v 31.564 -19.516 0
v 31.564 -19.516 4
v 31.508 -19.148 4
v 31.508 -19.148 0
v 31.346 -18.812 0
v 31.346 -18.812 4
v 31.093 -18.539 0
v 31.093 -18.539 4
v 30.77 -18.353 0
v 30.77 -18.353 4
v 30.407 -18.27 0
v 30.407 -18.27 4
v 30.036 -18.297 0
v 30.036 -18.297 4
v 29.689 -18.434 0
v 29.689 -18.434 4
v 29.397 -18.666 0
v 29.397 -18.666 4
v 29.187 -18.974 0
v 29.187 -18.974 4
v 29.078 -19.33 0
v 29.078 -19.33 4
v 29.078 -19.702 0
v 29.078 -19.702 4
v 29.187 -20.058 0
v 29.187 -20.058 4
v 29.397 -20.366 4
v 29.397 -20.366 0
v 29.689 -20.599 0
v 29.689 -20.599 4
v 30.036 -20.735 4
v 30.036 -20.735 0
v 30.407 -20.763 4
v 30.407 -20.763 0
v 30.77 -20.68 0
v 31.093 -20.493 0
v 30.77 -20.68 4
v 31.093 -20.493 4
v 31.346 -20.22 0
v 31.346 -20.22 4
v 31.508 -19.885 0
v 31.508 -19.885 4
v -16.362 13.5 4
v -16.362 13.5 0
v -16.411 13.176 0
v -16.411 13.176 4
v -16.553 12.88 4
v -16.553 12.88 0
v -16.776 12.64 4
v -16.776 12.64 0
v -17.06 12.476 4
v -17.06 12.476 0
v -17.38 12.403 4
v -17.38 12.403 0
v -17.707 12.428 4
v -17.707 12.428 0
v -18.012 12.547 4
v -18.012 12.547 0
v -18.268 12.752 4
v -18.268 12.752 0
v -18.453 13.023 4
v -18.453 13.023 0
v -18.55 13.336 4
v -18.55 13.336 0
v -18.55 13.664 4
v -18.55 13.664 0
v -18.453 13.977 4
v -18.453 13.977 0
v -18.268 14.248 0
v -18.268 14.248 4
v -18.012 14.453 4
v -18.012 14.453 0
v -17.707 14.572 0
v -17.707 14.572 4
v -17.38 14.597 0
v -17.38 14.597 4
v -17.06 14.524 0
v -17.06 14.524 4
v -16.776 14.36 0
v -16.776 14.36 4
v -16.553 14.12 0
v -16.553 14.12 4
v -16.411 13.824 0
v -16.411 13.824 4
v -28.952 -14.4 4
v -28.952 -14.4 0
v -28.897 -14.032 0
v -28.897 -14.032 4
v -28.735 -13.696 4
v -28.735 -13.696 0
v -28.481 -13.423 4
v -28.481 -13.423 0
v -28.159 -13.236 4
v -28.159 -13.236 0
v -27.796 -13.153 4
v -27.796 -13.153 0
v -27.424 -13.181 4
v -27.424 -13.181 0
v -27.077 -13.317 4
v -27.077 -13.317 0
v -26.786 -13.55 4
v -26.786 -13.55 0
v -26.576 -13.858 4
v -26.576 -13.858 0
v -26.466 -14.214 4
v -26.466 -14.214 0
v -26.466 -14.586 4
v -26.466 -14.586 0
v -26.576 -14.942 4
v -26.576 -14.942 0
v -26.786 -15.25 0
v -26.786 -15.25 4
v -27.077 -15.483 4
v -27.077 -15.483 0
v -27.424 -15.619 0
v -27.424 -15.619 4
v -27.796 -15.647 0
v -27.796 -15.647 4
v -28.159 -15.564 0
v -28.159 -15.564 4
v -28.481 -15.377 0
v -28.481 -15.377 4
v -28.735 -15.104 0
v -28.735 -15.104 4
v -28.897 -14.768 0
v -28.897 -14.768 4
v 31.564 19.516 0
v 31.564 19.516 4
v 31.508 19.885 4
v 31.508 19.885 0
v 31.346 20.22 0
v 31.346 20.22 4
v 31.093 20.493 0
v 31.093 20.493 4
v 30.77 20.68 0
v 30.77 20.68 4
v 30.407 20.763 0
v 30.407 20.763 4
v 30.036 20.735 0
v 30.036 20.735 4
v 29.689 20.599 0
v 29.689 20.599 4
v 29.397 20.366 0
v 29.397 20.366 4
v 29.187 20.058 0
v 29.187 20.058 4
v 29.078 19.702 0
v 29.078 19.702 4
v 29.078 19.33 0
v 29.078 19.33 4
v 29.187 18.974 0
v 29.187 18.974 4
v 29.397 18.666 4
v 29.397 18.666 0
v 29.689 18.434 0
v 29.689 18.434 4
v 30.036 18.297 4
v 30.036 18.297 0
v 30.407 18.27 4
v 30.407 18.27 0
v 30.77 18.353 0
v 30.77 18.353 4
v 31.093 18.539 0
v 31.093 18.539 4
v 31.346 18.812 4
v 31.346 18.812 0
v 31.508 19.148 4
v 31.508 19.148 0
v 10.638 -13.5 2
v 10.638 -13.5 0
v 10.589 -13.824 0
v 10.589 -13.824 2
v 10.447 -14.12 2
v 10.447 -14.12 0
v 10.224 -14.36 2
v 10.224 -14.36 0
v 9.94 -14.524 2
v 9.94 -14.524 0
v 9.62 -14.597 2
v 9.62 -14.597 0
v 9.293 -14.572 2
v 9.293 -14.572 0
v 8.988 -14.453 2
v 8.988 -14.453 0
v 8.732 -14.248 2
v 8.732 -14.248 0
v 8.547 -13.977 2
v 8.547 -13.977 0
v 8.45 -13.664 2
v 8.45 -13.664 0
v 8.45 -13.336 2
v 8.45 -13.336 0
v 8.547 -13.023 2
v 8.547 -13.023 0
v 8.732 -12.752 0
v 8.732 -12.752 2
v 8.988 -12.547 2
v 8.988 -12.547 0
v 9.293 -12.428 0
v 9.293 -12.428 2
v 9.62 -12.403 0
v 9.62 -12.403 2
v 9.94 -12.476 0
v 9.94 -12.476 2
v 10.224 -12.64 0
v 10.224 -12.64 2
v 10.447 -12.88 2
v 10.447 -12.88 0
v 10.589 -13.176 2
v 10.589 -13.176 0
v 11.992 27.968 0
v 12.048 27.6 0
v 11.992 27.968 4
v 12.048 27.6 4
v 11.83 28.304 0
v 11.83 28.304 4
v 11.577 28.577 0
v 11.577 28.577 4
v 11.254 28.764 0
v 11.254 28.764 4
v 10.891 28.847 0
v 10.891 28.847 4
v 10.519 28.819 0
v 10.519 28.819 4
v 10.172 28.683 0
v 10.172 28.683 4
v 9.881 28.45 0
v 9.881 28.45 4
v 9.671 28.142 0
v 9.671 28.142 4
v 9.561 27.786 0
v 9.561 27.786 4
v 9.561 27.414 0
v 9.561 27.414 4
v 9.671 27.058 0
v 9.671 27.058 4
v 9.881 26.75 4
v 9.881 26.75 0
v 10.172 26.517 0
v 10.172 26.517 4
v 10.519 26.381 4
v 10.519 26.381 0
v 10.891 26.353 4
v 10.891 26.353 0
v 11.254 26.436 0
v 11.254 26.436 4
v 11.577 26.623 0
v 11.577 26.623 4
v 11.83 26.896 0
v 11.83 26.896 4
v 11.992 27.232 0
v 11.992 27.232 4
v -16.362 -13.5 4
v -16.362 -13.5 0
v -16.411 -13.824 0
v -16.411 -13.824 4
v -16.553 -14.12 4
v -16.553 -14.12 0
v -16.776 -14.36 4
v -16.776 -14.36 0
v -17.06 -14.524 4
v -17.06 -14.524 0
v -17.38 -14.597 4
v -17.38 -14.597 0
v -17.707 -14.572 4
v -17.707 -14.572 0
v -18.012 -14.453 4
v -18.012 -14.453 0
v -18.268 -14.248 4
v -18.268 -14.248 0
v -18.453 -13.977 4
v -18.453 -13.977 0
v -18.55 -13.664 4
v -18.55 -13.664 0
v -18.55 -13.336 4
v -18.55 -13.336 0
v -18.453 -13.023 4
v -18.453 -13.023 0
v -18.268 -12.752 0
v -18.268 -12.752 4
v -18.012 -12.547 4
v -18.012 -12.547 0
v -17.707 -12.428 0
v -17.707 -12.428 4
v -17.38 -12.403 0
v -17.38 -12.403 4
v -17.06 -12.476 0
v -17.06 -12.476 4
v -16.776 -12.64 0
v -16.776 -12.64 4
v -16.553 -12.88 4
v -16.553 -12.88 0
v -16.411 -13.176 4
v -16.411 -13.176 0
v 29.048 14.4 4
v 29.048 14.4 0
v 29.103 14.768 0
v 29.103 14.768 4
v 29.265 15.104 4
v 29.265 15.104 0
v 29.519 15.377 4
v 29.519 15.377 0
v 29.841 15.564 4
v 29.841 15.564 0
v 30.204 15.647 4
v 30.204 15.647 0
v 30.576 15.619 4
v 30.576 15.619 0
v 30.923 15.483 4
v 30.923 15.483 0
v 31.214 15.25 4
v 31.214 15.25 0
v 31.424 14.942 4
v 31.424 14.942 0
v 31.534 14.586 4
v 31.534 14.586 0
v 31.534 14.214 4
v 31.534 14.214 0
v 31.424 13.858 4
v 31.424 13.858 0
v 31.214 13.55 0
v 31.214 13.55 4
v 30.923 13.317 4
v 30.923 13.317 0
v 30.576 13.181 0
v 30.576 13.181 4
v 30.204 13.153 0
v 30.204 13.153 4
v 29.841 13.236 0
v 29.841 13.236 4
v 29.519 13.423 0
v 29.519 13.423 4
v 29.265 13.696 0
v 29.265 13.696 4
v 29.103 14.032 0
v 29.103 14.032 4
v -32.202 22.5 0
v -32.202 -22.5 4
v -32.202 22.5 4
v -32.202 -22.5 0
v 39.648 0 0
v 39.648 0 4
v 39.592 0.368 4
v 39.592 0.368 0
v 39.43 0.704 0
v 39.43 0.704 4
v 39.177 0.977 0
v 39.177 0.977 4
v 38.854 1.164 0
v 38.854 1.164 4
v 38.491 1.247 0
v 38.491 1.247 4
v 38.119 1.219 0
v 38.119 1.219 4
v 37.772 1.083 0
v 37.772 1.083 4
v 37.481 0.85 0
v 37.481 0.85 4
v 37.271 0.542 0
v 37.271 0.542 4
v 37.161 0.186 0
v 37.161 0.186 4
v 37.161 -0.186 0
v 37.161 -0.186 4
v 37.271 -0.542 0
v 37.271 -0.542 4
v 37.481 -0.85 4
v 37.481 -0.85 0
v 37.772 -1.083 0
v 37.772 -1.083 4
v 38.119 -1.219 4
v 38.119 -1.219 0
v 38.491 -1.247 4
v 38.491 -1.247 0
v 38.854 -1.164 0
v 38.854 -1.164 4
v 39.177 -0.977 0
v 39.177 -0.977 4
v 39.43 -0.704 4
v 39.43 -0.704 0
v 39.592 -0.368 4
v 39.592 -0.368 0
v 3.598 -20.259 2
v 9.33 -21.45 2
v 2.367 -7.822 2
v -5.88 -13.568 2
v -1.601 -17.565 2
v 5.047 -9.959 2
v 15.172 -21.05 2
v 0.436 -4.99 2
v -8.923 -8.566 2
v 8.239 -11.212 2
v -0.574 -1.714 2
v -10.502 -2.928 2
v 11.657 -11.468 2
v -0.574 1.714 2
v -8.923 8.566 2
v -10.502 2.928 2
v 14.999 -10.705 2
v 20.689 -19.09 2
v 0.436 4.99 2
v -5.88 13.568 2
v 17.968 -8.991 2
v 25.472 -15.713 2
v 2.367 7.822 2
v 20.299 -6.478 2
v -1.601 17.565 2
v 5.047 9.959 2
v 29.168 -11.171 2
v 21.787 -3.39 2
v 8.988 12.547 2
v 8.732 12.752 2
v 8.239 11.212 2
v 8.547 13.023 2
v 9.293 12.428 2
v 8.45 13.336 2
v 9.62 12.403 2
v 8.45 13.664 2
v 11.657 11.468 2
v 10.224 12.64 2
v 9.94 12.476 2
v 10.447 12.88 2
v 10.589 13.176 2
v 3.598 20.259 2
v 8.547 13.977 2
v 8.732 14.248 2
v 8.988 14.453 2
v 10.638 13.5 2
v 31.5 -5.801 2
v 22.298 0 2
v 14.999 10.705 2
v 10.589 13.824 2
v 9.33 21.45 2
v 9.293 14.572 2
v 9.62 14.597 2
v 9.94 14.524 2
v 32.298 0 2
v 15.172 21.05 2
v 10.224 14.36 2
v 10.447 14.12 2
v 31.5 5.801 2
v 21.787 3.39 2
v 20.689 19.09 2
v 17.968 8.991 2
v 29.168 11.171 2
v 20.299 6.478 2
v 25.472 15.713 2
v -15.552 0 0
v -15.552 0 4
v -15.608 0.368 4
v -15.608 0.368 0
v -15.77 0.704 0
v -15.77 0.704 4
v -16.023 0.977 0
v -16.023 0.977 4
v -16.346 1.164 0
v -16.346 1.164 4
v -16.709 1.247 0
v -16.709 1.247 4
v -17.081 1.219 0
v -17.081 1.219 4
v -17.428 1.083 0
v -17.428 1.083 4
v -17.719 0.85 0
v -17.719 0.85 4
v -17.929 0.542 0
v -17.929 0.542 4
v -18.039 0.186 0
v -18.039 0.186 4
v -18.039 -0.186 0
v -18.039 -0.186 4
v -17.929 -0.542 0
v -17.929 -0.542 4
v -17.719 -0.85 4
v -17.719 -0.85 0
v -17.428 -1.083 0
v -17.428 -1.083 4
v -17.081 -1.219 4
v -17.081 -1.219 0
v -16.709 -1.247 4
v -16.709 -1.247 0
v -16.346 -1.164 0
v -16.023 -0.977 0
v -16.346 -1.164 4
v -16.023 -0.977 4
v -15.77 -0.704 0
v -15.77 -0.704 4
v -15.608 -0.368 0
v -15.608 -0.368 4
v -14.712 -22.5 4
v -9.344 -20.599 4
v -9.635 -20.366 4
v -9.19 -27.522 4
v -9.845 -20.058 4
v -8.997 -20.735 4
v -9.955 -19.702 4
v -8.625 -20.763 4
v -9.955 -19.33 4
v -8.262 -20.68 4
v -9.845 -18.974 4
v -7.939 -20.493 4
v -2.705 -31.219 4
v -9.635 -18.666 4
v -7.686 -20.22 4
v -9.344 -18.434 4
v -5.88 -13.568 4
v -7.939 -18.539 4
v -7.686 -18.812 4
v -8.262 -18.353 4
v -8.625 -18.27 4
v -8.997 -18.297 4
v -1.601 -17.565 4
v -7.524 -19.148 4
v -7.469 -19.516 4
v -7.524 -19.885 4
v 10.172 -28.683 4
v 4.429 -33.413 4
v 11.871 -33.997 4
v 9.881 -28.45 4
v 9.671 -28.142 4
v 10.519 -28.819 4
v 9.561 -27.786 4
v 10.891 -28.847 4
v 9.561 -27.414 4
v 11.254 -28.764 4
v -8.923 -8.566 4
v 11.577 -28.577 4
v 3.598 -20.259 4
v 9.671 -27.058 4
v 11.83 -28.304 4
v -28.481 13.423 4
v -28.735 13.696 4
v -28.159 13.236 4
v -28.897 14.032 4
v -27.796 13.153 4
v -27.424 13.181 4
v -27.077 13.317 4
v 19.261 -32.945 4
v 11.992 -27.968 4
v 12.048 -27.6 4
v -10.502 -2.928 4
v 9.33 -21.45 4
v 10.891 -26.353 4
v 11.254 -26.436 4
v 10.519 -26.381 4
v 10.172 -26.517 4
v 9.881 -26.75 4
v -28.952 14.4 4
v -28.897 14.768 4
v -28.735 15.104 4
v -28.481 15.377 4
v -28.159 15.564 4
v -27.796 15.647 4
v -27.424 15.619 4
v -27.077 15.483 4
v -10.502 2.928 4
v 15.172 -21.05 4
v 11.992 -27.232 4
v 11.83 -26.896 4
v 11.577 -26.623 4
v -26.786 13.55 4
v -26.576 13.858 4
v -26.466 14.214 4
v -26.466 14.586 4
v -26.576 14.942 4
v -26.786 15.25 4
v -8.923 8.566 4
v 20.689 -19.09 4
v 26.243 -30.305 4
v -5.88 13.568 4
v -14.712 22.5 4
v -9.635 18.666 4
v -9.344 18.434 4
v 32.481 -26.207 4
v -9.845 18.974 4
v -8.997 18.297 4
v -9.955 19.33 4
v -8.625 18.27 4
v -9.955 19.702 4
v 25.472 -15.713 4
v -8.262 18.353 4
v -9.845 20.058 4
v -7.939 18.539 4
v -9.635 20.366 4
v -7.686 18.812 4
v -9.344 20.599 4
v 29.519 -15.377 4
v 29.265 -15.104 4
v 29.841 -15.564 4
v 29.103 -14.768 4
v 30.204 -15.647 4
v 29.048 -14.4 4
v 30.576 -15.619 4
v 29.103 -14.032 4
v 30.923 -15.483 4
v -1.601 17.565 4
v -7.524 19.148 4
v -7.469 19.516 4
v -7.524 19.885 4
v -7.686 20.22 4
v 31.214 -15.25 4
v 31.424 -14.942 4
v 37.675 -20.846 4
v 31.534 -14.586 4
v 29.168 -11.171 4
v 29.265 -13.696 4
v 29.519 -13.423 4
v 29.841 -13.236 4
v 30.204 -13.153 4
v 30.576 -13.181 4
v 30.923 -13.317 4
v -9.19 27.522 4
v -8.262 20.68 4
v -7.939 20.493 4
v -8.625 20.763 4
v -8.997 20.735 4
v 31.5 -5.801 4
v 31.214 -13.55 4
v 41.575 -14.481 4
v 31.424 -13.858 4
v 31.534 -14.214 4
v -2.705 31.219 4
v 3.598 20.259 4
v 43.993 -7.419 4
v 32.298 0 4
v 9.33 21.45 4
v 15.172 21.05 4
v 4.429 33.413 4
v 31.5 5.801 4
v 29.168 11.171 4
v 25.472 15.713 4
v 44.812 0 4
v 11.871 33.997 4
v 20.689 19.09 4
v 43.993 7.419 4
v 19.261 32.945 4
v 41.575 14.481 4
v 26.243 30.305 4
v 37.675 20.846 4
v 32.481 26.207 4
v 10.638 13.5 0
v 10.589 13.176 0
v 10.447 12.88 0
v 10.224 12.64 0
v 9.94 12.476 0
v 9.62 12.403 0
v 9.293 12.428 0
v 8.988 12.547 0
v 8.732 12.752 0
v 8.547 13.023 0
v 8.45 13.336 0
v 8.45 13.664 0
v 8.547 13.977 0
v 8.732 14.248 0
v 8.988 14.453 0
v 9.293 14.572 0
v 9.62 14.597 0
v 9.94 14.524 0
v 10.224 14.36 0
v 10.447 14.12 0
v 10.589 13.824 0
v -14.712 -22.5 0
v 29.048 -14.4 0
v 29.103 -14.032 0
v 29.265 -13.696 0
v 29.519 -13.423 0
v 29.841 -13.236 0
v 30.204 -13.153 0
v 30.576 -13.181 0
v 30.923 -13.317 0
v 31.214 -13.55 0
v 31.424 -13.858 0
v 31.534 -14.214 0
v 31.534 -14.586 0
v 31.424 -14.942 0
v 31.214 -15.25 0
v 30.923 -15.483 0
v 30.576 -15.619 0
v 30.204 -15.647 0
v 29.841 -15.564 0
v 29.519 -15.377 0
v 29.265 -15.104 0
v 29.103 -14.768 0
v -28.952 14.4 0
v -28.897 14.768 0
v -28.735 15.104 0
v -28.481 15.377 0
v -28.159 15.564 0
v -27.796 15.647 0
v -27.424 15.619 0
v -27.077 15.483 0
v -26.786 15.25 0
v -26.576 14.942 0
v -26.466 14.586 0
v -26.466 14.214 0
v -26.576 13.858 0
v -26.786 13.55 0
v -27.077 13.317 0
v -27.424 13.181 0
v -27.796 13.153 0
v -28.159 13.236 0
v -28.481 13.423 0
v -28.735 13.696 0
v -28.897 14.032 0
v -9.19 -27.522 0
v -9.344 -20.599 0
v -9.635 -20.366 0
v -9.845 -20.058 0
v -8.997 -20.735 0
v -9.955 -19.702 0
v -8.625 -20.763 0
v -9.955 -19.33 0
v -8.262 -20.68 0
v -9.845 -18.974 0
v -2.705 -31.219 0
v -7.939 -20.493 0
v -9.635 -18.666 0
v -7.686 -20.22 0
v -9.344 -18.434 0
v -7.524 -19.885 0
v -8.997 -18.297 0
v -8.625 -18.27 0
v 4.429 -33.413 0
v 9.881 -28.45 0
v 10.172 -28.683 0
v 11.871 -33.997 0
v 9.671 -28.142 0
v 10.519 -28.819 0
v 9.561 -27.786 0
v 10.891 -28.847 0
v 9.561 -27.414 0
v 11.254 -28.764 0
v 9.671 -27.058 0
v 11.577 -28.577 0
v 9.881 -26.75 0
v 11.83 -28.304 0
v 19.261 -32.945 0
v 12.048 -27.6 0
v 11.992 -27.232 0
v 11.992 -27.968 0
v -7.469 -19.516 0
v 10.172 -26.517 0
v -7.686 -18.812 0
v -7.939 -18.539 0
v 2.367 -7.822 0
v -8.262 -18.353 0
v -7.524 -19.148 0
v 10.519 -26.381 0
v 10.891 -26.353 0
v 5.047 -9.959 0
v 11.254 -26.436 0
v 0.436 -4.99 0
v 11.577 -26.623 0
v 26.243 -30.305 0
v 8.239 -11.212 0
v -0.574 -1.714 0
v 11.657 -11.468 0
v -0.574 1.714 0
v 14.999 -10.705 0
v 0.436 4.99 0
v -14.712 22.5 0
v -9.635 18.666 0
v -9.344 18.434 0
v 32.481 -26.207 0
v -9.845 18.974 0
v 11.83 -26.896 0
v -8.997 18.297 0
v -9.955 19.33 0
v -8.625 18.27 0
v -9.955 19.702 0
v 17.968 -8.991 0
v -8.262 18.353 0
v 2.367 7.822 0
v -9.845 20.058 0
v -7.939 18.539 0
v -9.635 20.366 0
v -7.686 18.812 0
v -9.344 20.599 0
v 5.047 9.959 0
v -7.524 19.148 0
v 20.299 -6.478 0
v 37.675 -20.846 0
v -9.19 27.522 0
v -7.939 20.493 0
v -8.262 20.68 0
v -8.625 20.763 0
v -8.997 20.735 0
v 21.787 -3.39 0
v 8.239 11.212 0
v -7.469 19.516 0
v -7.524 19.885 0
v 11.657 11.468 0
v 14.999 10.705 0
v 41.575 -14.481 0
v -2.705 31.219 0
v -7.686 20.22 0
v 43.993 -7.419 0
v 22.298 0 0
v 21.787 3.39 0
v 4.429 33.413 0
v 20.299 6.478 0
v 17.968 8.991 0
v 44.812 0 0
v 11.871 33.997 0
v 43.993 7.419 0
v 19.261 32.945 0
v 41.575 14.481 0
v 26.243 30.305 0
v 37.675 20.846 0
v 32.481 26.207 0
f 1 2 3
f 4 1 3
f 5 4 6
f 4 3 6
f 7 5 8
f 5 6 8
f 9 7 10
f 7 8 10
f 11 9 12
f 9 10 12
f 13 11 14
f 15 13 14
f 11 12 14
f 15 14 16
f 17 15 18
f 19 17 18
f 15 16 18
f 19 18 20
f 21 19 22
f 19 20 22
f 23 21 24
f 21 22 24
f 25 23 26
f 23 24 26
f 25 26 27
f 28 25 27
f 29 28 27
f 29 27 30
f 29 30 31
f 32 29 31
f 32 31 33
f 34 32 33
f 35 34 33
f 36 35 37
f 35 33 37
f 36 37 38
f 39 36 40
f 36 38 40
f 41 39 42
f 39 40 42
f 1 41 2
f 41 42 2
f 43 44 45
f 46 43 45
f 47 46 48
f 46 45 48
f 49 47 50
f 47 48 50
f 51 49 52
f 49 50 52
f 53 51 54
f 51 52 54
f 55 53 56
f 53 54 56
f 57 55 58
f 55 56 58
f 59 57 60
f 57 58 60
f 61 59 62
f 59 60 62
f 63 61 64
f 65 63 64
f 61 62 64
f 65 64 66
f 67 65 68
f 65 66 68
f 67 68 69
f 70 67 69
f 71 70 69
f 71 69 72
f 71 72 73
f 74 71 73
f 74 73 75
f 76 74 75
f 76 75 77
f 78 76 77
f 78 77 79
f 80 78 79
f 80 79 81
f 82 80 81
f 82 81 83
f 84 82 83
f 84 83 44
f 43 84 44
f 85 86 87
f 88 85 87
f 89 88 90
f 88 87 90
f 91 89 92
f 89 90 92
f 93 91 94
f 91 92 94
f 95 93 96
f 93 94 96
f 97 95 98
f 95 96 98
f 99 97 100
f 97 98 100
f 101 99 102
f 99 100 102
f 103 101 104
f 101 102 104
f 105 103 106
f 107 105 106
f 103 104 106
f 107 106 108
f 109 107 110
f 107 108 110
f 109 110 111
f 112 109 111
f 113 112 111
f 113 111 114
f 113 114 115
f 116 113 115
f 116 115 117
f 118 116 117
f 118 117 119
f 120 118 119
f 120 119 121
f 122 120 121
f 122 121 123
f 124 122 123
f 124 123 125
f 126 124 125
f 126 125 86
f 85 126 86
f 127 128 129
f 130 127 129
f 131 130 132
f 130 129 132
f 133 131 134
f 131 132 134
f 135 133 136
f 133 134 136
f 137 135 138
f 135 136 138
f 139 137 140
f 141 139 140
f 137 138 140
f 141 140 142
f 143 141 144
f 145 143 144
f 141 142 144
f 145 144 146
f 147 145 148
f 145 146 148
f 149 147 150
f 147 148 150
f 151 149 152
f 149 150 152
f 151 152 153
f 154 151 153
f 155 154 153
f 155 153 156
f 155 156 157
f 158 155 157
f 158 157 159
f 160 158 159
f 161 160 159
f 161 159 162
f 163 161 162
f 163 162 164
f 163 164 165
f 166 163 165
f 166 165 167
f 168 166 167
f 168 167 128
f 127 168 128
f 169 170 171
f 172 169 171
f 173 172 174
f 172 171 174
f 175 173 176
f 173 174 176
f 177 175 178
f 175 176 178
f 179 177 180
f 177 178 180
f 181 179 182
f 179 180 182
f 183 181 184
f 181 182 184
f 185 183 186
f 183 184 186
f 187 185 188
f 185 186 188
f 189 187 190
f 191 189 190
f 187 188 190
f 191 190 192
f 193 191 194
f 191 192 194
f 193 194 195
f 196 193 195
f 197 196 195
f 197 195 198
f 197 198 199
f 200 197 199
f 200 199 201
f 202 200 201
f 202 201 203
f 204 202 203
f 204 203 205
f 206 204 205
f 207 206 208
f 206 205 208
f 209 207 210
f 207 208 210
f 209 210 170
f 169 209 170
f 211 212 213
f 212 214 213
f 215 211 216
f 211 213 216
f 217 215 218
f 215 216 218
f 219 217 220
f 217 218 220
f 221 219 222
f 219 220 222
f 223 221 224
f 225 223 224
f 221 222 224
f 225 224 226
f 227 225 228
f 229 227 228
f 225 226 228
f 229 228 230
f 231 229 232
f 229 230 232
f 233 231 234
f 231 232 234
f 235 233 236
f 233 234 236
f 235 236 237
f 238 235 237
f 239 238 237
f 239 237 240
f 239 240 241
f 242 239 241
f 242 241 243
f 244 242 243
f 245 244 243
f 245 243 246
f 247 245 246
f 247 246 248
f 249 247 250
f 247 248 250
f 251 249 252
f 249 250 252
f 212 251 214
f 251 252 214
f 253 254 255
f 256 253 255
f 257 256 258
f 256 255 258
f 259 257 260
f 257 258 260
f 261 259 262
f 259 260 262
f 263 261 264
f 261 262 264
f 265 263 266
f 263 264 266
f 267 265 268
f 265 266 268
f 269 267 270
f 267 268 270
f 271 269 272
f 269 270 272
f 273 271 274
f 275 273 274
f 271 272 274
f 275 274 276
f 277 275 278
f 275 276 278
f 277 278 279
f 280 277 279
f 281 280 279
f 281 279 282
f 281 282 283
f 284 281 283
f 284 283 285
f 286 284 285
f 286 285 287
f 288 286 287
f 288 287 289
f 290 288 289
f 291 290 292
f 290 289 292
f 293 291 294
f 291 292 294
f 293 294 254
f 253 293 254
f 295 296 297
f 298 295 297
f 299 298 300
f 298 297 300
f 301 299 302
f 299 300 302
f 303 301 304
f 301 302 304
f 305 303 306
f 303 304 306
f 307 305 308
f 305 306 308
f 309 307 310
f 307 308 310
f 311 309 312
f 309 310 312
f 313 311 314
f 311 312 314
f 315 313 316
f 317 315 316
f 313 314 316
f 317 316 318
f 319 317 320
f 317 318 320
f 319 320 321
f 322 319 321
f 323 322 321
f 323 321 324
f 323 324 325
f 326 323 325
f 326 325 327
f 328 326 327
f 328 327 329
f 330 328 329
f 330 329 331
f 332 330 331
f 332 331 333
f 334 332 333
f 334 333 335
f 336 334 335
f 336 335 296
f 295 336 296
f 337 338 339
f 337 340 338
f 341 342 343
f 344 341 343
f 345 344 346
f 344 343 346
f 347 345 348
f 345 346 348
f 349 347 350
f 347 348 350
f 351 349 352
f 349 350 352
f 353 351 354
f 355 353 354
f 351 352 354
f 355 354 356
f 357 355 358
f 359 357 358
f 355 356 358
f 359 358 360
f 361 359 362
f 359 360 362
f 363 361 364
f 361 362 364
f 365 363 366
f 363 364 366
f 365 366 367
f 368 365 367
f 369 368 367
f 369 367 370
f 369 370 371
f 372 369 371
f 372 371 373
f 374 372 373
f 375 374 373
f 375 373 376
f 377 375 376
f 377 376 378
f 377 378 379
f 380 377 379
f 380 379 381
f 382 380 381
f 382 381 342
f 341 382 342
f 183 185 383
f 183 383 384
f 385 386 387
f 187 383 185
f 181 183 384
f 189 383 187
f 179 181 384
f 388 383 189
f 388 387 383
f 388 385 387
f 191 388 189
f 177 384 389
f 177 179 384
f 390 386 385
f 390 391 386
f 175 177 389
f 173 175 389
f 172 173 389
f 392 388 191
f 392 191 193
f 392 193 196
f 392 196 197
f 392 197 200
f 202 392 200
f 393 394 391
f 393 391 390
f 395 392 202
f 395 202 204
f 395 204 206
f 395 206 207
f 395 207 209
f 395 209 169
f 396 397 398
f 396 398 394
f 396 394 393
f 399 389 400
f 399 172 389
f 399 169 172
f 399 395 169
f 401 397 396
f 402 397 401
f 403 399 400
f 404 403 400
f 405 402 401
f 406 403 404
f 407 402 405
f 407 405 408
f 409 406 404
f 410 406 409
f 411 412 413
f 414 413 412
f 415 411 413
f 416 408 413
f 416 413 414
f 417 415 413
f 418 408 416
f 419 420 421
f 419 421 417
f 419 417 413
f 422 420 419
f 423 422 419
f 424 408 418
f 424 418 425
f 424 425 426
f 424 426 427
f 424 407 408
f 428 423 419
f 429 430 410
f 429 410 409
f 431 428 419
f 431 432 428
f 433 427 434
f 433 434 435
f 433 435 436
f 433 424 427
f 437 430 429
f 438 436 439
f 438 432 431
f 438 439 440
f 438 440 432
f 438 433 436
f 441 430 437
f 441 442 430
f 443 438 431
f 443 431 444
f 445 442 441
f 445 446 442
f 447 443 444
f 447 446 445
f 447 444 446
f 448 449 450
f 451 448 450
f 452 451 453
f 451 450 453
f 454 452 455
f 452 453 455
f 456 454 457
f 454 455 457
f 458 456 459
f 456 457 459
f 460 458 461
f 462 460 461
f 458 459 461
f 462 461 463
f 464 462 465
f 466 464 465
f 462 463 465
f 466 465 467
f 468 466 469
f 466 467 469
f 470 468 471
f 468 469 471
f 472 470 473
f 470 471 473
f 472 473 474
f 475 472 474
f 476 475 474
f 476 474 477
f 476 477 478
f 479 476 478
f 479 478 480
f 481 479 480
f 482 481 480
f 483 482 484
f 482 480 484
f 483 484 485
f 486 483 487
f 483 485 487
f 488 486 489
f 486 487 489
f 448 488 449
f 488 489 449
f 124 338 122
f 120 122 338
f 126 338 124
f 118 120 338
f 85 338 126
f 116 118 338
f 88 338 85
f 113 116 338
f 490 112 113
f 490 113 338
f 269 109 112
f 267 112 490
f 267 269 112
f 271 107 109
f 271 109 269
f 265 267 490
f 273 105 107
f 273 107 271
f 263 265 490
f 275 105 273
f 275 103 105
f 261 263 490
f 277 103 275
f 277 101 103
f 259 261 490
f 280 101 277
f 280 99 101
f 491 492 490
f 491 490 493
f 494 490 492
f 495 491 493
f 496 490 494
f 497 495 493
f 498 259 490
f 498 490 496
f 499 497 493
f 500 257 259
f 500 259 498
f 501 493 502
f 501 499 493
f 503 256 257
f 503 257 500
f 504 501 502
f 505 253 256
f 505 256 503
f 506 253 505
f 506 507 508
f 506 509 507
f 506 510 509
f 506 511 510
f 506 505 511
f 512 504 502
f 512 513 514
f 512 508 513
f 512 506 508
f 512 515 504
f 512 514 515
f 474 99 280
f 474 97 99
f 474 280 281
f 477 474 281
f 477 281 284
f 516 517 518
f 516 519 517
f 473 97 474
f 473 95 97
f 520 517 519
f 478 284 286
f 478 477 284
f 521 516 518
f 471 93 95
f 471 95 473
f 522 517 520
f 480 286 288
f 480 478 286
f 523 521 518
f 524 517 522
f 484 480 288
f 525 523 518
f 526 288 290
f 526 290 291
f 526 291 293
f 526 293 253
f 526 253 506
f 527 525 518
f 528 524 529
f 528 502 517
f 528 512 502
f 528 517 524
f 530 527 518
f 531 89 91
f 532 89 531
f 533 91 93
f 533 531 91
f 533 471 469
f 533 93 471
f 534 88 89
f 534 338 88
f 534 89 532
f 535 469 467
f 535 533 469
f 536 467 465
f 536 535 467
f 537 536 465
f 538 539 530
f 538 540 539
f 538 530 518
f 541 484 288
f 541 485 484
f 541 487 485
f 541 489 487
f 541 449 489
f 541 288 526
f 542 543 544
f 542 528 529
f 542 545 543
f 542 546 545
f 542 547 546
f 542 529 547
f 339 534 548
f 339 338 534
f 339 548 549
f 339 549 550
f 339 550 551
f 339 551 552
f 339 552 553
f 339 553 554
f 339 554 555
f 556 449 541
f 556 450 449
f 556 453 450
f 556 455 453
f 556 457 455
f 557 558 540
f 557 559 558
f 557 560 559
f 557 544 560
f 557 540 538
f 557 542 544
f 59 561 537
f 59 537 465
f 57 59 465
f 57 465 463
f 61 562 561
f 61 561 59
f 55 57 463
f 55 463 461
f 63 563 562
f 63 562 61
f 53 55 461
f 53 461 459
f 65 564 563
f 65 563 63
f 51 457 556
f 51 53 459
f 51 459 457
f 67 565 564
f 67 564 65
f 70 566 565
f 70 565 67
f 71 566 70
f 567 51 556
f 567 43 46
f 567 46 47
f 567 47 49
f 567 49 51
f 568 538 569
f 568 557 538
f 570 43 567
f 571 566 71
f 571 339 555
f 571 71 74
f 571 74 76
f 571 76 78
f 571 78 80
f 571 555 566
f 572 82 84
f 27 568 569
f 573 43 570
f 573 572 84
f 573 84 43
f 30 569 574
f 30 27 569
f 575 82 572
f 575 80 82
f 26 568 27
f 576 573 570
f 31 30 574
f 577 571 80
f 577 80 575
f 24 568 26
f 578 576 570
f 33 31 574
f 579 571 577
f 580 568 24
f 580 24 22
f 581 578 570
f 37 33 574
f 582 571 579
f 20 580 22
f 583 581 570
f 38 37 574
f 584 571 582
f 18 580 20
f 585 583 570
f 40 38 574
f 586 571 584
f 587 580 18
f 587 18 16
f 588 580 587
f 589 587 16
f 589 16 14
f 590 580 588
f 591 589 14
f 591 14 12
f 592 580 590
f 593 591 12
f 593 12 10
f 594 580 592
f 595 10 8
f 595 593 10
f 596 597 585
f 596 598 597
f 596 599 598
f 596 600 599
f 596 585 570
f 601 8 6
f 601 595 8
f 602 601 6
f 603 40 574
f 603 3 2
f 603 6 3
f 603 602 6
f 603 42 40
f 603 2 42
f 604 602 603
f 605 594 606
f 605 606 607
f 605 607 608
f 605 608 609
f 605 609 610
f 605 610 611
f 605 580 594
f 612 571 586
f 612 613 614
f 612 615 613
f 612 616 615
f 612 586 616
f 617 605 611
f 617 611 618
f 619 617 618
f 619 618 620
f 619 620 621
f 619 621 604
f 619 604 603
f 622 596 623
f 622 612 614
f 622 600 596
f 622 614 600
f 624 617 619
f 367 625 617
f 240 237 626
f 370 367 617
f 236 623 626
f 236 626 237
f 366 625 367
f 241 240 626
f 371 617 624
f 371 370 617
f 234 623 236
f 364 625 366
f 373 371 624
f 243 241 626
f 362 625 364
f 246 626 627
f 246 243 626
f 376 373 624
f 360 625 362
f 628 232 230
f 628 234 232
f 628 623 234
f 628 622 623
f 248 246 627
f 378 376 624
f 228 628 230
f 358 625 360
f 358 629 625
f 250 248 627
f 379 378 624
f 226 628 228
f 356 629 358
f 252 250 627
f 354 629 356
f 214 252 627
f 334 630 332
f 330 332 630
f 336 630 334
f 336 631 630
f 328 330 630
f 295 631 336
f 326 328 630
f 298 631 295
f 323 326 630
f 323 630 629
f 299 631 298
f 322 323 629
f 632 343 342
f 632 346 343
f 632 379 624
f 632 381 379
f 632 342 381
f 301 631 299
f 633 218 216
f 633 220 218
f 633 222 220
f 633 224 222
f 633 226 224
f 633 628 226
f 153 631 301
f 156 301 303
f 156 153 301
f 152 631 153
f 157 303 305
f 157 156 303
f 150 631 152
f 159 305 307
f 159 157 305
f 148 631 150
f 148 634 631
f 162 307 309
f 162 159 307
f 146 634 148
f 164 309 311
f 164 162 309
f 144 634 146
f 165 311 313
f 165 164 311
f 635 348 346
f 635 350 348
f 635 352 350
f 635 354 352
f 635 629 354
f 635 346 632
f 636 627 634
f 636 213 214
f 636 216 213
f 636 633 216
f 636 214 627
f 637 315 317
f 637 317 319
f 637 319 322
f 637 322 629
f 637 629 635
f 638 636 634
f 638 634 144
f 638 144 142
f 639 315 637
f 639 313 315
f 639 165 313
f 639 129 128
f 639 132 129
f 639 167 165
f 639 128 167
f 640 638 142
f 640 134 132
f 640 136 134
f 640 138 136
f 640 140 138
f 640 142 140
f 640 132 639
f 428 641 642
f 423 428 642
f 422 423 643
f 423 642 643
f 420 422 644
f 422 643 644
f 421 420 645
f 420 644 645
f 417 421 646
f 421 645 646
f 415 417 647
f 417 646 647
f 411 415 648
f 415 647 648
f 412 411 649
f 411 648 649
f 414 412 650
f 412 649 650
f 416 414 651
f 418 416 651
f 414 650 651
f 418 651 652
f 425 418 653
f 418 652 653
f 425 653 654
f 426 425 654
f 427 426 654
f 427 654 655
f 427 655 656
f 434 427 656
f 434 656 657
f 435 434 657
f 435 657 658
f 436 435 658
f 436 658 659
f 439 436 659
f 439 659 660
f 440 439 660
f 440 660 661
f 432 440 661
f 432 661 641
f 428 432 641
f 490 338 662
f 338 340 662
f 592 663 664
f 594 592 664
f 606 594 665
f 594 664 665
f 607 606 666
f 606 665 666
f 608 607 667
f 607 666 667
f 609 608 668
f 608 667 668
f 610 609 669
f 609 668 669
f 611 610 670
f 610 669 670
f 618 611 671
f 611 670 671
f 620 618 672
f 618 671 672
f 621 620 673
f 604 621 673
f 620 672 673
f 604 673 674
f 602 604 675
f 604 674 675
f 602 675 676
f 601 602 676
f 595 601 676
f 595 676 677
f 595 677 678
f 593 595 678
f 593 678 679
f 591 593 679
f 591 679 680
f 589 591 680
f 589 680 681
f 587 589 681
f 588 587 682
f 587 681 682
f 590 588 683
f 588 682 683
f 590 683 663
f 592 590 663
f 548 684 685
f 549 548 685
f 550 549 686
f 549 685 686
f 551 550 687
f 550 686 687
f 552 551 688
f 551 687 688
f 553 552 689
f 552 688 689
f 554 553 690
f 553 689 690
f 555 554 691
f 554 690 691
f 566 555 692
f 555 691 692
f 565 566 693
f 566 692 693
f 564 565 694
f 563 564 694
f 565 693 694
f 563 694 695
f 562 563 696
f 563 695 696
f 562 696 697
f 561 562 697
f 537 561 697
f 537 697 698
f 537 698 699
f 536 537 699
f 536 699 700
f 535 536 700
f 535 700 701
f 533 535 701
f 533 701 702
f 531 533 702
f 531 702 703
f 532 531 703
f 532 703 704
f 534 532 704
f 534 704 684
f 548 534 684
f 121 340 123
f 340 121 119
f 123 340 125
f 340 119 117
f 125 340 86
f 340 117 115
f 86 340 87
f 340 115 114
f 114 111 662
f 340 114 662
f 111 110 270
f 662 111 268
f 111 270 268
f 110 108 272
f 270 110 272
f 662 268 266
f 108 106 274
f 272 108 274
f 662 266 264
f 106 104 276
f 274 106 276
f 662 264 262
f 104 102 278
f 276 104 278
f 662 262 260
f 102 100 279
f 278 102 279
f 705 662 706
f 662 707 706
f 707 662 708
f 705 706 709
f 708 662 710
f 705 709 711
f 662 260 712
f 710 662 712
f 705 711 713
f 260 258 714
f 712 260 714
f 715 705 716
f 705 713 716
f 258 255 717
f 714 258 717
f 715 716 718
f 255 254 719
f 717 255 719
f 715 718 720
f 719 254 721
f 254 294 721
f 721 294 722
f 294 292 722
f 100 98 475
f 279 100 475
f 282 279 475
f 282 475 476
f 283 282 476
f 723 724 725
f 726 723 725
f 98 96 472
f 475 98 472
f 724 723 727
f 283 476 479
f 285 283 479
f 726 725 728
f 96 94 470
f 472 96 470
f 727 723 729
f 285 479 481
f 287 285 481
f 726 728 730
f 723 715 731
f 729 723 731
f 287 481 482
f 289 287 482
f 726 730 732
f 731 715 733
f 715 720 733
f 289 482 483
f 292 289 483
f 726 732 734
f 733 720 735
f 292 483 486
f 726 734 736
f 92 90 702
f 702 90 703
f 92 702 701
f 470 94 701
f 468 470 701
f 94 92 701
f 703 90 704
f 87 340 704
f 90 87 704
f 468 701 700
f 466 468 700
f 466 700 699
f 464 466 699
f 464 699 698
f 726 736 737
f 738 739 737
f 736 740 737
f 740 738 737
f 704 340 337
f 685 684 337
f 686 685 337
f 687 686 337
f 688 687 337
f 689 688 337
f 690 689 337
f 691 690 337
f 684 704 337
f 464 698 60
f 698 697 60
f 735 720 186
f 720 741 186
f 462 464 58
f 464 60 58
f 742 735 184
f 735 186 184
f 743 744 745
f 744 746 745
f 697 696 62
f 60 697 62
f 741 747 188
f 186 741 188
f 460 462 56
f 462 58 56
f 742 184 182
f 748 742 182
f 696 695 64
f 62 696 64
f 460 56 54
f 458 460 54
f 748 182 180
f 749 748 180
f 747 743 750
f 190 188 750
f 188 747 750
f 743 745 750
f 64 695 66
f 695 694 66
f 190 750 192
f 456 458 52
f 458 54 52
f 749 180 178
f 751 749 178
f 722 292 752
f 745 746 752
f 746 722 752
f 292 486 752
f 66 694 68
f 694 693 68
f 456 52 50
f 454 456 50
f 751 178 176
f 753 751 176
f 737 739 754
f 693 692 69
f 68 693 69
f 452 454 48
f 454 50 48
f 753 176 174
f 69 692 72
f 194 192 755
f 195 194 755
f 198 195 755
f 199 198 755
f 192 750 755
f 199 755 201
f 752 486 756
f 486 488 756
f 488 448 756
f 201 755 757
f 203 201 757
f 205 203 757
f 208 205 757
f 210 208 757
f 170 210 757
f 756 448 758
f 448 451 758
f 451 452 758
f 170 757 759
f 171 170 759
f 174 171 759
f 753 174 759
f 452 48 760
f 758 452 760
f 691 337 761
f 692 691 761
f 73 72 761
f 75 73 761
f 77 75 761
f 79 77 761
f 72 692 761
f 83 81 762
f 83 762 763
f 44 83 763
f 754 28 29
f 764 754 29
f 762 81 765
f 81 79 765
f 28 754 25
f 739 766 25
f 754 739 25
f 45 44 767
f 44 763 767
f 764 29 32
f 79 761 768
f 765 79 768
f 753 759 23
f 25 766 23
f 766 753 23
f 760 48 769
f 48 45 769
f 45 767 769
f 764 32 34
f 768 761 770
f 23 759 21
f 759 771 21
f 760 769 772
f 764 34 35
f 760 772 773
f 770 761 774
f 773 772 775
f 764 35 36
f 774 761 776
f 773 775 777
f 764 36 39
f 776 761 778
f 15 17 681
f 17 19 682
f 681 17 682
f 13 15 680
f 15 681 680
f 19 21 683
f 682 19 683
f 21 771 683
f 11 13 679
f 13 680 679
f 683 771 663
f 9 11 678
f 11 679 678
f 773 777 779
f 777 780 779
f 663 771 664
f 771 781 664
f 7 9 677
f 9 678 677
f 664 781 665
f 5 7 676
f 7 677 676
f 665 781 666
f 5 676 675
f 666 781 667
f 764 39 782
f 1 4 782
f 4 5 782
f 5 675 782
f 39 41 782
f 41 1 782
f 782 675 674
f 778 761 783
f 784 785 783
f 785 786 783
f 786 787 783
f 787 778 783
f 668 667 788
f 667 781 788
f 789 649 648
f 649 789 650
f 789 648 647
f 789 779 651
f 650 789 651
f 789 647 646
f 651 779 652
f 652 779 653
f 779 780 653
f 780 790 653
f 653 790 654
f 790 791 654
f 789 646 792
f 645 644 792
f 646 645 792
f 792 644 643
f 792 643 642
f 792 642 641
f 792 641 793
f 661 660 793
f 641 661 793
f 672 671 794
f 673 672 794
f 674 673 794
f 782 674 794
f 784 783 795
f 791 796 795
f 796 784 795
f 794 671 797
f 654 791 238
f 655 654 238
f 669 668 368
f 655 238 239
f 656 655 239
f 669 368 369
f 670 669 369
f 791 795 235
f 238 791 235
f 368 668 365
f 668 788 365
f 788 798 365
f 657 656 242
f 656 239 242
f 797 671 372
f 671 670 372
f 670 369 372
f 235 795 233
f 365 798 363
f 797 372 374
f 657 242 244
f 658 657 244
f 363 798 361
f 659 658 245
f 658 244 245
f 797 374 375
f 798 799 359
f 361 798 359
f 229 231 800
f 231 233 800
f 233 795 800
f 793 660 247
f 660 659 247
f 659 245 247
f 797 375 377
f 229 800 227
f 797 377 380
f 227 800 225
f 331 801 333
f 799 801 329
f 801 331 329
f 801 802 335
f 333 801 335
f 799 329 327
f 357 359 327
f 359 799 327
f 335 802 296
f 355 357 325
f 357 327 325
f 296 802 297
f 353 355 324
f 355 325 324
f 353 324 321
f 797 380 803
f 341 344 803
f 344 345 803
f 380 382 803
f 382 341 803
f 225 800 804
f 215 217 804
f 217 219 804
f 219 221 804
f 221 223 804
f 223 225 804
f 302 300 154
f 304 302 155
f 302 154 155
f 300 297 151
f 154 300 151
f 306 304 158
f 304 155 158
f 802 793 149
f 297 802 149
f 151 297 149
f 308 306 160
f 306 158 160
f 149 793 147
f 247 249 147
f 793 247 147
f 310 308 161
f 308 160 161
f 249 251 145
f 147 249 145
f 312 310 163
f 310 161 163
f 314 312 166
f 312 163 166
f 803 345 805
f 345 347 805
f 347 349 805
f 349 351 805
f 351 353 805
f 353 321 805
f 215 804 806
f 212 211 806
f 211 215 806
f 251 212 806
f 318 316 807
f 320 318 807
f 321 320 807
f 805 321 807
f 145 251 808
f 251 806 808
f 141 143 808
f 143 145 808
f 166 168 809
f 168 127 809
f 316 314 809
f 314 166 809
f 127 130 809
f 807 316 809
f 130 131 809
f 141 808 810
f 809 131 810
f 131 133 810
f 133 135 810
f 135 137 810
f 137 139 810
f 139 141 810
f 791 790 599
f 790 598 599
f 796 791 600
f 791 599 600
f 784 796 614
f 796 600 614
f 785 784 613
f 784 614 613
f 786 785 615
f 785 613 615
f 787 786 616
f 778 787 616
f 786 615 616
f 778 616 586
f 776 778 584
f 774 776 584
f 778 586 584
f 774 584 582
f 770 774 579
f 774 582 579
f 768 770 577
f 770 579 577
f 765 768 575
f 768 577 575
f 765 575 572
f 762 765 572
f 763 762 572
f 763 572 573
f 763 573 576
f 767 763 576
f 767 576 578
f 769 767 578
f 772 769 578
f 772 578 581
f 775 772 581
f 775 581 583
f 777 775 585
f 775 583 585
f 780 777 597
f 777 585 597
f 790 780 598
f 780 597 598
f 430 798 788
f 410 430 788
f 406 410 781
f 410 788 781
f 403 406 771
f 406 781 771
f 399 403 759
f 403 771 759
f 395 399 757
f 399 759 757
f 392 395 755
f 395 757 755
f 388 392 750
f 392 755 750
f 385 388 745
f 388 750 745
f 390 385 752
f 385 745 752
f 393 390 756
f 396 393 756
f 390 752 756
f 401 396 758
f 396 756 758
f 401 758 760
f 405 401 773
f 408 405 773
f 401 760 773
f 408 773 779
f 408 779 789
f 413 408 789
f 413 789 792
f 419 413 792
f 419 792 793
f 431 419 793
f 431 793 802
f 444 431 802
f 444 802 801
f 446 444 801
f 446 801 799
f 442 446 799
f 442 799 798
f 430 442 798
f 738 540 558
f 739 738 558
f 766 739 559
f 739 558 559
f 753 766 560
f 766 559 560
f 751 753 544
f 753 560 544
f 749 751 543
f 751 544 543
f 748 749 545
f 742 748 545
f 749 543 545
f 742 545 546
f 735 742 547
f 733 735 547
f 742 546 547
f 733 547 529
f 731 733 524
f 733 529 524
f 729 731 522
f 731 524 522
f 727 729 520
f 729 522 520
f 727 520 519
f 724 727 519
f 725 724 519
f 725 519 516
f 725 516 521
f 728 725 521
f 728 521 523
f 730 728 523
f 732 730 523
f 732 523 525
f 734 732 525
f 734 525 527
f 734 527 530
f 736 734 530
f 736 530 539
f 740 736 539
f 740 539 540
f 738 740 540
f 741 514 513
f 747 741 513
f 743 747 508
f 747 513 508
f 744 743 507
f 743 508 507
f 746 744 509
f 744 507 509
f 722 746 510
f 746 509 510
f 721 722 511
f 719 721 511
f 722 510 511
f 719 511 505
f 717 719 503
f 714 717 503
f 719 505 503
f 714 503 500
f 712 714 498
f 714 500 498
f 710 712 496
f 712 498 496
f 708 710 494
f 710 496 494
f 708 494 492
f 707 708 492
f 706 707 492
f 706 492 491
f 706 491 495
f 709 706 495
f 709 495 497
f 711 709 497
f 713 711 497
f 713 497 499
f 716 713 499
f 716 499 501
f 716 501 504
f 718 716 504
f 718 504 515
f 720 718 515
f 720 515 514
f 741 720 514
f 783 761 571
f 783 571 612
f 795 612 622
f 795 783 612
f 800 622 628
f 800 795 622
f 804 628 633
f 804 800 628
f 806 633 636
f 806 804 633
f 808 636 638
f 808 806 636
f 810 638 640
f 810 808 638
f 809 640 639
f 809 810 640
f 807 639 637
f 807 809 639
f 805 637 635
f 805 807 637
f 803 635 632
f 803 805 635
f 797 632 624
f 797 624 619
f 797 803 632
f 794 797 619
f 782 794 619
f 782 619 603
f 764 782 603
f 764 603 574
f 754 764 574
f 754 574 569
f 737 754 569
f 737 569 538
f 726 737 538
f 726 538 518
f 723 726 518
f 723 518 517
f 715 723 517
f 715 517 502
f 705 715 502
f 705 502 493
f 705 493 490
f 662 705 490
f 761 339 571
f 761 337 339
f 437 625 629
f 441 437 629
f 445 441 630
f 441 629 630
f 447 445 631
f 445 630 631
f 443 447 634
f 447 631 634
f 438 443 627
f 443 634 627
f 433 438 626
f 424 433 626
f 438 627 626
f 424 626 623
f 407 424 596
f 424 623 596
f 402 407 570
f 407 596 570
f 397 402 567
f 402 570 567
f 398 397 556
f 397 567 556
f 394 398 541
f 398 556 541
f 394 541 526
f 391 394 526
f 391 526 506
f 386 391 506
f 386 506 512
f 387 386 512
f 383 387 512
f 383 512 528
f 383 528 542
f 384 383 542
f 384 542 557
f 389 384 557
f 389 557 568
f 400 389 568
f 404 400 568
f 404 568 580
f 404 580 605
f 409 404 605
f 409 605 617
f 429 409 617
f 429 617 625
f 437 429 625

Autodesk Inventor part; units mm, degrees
ref_plane "YZ Plane" through (0, 0, 0) normal (1, 0, 0) x (0, 1, 0)
ref_plane "XZ Plane" through (0, 0, 0) normal (0, 1, 0) x (-1, 0, 0)
ref_plane "XY Plane" through (0, 0, 0) normal (0, 0, 1) x (1, 0, 0)
sketch "スケッチ1" plane through (0, 0, 0) normal (0, 0, 1) x (1, 0, 0)
  line L0 (22.7979, -11.619) -> (22.7979, 11.619) construction
  arc A0 (22.7979, 11.619) -> (11.7979, 16) centre (11.7979, 0) ccw construction
  line L1 (11.7979, 16) -> (-18.2021, 16) construction
  arc A1 (-18.2021, 16) -> (-20.2021, 14) centre (-18.2021, 14) ccw construction
  line L2 (-20.2021, 14) -> (-20.2021, -14) construction
  arc A2 (-20.2021, -14) -> (-18.2021, -16) centre (-18.2021, -14) ccw construction
  line L3 (-18.2021, -16) -> (11.7979, -16) construction
  arc A3 (11.7979, -16) -> (22.7979, -11.619) centre (11.7979, 0) ccw construction
  circle A4 centre (-17.4618, -13.5) radius 1.05 construction
  circle A5 centre (-17.4618, 13.5) radius 1.05 construction
  circle A6 centre (9.5382, -13.5) radius 1.05 construction
  circle A7 centre (9.5382, 13.5) radius 1.05 construction
  circle A8 centre (10.7975, 0) radius 2.7 projected
  circle A9 centre (-57.7021, 15) radius 1.6 construction
  circle A10 centre (-27.7021, 15) radius 1.6 construction
  line L4 (-65.2021, 7.5) -> (-65.2021, 22.5) projected
  line L5 (-65.2021, 7.5) -> (-20.2021, 7.5) construction
  line L6 (-20.2021, 22.5) -> (-20.2021, 7.5) construction
  line L7 (-65.2021, 22.5) -> (-20.2021, 22.5) projected
  circle A11 centre (-57.7021, -15) radius 1.6 construction
  circle A12 centre (-27.7021, -15) radius 1.6 construction
  line L8 (-65.2021, -22.5) -> (-65.2021, -7.5) projected
  line L9 (-65.2021, -22.5) -> (-20.2021, -22.5) projected
  line L10 (-20.2021, -7.5) -> (-20.2021, -22.5) construction
  line L11 (-65.2021, -7.5) -> (-20.2021, -7.5) construction
  circle A13 centre (-57.7021, -15) radius 1.6 construction
  circle A14 centre (-57.7021, 15) radius 1.6 construction
  line L12 (-50.2021, -22.5) -> (-65.2021, -22.5) projected
  line L13 (-50.2021, -22.5) -> (-50.2021, 22.5) construction
  line L14 (-65.2021, 22.5) -> (-50.2021, 22.5) projected
  line L15 (-65.2021, -22.5) -> (-65.2021, 22.5) projected
  circle A15 centre (10.7975, 0) radius 27.5 construction
  line L16 (-65.2021, 22.5) -> (-14.7118, 22.5)
  line L17 (-65.2021, 22.5) -> (-65.2021, -22.5)
  line L18 (-65.2021, -22.5) -> (-14.7118, -22.5)
  arc A16 (-14.7118, -22.5) -> (-14.7118, 22.5) centre (10.7975, 0) ccw
  circle A17 centre (10.7975, 0) radius 11.5
  circle A18 centre (9.5382, 13.5) radius 1.1
  circle A19 centre (9.5382, -13.5) radius 1.1
  circle A20 centre (-17.4618, 13.5) radius 1.1
  circle A21 centre (-17.4618, -13.5) radius 1.1
  circle A22 centre (-27.7021, 15) radius 1.25
  circle A23 centre (-57.7021, 15) radius 1.25
  circle A24 centre (-57.7021, -15) radius 1.25
  circle A25 centre (-27.7021, -15) radius 1.25
  point P0 (0, 0)
  dimension "d0" = 55
  dimension "d1" = 23
  dimension "d2" = 2.2
  dimension "d3" = 2.2
  dimension "d4" = 2.2
  dimension "d5" = 2.2
  dimension "d6" = 2.5
  dimension "d7" = 2.5
  dimension "d8" = 2.5
  dimension "d9" = 2.5
extrude "押し出し1" add sketch "スケッチ1" along normal blind 4 contours L4 L7 L16 A16 L18 L9 L8 L15
sketch "スケッチ2" plane through (0, 0, 4) normal (0, 0, 1) x (1, 0, 0)
  circle A0 centre (10.7975, 0) radius 11.5 projected
  circle A1 centre (-27.7021, -15) radius 1.25 projected
  circle A2 centre (-57.7021, -15) radius 1.25 projected
  circle A3 centre (-57.7021, 15) radius 1.25 projected
  circle A4 centre (-27.7021, 15) radius 1.25 projected
  circle A5 centre (-17.4618, -13.5) radius 1.1 projected
  circle A6 centre (-17.4618, 13.5) radius 1.1 projected
  circle A7 centre (9.5382, -13.5) radius 1.1 projected
  circle A8 centre (9.5382, 13.5) radius 1.1 projected
  line L0 (-65.2021, 22.5) -> (-65.2021, -22.5) projected
  line L1 (-65.2021, -22.5) -> (-14.7118, -22.5) projected
  arc A9 (-14.7118, -22.5) -> (-14.7118, 22.5) centre (10.7975, 0) ccw projected
  line L2 (-14.7118, 22.5) -> (-65.2021, 22.5) projected
  circle A10 centre (10.7975, 0) radius 21.5
  point P0 (0, 0)
  dimension "d12" = 43
extrude "押し出し4" cut sketch "スケッチ2" against normal blind 2 contours A10
sketch "スケッチ4" plane through (0, 0, 4) normal (0, 0, 1) x (1, 0, 0)
  circle A0 centre (10.7975, 0) radius 21.5 projected
  circle A1 centre (-27.7021, -15) radius 1.25 projected
  circle A2 centre (-57.7021, -15) radius 1.25 projected
  circle A3 centre (-57.7021, 15) radius 1.25 projected
  circle A4 centre (-27.7021, 15) radius 1.25 projected
  circle A5 centre (-17.4618, -13.5) radius 1.1 projected
  circle A6 centre (-17.4618, 13.5) radius 1.1 projected
  line L0 (-65.2021, 22.5) -> (-65.2021, -22.5) projected
  line L1 (-65.2021, -22.5) -> (-14.7118, -22.5) projected
  arc A7 (-14.7118, -22.5) -> (-14.7118, 22.5) centre (10.7975, 0) ccw projected
  line L2 (-14.7118, 22.5) -> (-65.2021, 22.5) projected
  circle A8 centre (10.7975, 0) radius 27.6
  circle A9 centre (38.3975, 0) radius 1.25
  circle A10 centre (30.3137, 19.5161) radius 1.25
  circle A11 centre (10.7975, 27.6) radius 1.25
  circle A12 centre (-8.7186, 19.5161) radius 1.25
  circle A13 centre (-16.8025, 0) radius 1.25
  circle A14 centre (-8.7186, -19.5161) radius 1.25
  circle A15 centre (10.7975, -27.6) radius 1.25
  circle A16 centre (30.3137, -19.5161) radius 1.25
  point P0 (0, 0)
  dimension "d25" = 55.2
  dimension "d26" = 2.5
  dimension "d29" = 360
extrude "押し出し5" cut sketch "スケッチ4" against normal through all contours A8 A9 | A8 A9 | A10 A8 | A8 A10 | A16 A8 | A8 A16 | A11 A8 | A8 A11 | A15 A8 | A8 A15 | A12 A8 | A8 A12 | A14 A8 | A8 A14 | A13 A8 | A8 A13
move faces "移動1" translate (33, 0, 0) faces at (-65.2021, 7.5, 1.3333)
sketch "スケッチ8" plane through (0, 0, 0) normal (0, 0, -1) x (-1, 0, 0)
  circle A0 centre (27.7021, -15) radius 1.25 projected
  circle A1 centre (27.7021, 15) radius 1.25 projected
  point P0 (0, 0)
extrude "押し出し7" add sketch "スケッチ8" against normal blind 4
sketch "スケッチ7" plane through (0, 0, 0) normal (0, 0, -1) x (-1, 0, 0)
  circle A0 centre (-30.2979, -14.4) radius 1.6 projected
  circle A1 centre (-30.2979, 14.4) radius 1.6 projected
  circle A2 centre (27.7021, -14.4) radius 1.6 projected
  circle A3 centre (27.7021, 14.4) radius 1.6 projected
  circle A4 centre (-30.2979, -14.4) radius 1.25
  circle A5 centre (-30.2979, 14.4) radius 1.25
  circle A6 centre (27.7021, -14.4) radius 1.25
  circle A7 centre (27.7021, 14.4) radius 1.25
  point P0 (0, 0)
  dimension "d45" = 2.5
  dimension "d46" = 2.5
  dimension "d47" = 2.5
  dimension "d48" = 2.5
extrude "押し出し8" cut sketch "スケッチ7" against normal through all contours A4 | A5 | A6 | A7
properties part number "先端モータマウントC" material "アルミニウム 6061"
